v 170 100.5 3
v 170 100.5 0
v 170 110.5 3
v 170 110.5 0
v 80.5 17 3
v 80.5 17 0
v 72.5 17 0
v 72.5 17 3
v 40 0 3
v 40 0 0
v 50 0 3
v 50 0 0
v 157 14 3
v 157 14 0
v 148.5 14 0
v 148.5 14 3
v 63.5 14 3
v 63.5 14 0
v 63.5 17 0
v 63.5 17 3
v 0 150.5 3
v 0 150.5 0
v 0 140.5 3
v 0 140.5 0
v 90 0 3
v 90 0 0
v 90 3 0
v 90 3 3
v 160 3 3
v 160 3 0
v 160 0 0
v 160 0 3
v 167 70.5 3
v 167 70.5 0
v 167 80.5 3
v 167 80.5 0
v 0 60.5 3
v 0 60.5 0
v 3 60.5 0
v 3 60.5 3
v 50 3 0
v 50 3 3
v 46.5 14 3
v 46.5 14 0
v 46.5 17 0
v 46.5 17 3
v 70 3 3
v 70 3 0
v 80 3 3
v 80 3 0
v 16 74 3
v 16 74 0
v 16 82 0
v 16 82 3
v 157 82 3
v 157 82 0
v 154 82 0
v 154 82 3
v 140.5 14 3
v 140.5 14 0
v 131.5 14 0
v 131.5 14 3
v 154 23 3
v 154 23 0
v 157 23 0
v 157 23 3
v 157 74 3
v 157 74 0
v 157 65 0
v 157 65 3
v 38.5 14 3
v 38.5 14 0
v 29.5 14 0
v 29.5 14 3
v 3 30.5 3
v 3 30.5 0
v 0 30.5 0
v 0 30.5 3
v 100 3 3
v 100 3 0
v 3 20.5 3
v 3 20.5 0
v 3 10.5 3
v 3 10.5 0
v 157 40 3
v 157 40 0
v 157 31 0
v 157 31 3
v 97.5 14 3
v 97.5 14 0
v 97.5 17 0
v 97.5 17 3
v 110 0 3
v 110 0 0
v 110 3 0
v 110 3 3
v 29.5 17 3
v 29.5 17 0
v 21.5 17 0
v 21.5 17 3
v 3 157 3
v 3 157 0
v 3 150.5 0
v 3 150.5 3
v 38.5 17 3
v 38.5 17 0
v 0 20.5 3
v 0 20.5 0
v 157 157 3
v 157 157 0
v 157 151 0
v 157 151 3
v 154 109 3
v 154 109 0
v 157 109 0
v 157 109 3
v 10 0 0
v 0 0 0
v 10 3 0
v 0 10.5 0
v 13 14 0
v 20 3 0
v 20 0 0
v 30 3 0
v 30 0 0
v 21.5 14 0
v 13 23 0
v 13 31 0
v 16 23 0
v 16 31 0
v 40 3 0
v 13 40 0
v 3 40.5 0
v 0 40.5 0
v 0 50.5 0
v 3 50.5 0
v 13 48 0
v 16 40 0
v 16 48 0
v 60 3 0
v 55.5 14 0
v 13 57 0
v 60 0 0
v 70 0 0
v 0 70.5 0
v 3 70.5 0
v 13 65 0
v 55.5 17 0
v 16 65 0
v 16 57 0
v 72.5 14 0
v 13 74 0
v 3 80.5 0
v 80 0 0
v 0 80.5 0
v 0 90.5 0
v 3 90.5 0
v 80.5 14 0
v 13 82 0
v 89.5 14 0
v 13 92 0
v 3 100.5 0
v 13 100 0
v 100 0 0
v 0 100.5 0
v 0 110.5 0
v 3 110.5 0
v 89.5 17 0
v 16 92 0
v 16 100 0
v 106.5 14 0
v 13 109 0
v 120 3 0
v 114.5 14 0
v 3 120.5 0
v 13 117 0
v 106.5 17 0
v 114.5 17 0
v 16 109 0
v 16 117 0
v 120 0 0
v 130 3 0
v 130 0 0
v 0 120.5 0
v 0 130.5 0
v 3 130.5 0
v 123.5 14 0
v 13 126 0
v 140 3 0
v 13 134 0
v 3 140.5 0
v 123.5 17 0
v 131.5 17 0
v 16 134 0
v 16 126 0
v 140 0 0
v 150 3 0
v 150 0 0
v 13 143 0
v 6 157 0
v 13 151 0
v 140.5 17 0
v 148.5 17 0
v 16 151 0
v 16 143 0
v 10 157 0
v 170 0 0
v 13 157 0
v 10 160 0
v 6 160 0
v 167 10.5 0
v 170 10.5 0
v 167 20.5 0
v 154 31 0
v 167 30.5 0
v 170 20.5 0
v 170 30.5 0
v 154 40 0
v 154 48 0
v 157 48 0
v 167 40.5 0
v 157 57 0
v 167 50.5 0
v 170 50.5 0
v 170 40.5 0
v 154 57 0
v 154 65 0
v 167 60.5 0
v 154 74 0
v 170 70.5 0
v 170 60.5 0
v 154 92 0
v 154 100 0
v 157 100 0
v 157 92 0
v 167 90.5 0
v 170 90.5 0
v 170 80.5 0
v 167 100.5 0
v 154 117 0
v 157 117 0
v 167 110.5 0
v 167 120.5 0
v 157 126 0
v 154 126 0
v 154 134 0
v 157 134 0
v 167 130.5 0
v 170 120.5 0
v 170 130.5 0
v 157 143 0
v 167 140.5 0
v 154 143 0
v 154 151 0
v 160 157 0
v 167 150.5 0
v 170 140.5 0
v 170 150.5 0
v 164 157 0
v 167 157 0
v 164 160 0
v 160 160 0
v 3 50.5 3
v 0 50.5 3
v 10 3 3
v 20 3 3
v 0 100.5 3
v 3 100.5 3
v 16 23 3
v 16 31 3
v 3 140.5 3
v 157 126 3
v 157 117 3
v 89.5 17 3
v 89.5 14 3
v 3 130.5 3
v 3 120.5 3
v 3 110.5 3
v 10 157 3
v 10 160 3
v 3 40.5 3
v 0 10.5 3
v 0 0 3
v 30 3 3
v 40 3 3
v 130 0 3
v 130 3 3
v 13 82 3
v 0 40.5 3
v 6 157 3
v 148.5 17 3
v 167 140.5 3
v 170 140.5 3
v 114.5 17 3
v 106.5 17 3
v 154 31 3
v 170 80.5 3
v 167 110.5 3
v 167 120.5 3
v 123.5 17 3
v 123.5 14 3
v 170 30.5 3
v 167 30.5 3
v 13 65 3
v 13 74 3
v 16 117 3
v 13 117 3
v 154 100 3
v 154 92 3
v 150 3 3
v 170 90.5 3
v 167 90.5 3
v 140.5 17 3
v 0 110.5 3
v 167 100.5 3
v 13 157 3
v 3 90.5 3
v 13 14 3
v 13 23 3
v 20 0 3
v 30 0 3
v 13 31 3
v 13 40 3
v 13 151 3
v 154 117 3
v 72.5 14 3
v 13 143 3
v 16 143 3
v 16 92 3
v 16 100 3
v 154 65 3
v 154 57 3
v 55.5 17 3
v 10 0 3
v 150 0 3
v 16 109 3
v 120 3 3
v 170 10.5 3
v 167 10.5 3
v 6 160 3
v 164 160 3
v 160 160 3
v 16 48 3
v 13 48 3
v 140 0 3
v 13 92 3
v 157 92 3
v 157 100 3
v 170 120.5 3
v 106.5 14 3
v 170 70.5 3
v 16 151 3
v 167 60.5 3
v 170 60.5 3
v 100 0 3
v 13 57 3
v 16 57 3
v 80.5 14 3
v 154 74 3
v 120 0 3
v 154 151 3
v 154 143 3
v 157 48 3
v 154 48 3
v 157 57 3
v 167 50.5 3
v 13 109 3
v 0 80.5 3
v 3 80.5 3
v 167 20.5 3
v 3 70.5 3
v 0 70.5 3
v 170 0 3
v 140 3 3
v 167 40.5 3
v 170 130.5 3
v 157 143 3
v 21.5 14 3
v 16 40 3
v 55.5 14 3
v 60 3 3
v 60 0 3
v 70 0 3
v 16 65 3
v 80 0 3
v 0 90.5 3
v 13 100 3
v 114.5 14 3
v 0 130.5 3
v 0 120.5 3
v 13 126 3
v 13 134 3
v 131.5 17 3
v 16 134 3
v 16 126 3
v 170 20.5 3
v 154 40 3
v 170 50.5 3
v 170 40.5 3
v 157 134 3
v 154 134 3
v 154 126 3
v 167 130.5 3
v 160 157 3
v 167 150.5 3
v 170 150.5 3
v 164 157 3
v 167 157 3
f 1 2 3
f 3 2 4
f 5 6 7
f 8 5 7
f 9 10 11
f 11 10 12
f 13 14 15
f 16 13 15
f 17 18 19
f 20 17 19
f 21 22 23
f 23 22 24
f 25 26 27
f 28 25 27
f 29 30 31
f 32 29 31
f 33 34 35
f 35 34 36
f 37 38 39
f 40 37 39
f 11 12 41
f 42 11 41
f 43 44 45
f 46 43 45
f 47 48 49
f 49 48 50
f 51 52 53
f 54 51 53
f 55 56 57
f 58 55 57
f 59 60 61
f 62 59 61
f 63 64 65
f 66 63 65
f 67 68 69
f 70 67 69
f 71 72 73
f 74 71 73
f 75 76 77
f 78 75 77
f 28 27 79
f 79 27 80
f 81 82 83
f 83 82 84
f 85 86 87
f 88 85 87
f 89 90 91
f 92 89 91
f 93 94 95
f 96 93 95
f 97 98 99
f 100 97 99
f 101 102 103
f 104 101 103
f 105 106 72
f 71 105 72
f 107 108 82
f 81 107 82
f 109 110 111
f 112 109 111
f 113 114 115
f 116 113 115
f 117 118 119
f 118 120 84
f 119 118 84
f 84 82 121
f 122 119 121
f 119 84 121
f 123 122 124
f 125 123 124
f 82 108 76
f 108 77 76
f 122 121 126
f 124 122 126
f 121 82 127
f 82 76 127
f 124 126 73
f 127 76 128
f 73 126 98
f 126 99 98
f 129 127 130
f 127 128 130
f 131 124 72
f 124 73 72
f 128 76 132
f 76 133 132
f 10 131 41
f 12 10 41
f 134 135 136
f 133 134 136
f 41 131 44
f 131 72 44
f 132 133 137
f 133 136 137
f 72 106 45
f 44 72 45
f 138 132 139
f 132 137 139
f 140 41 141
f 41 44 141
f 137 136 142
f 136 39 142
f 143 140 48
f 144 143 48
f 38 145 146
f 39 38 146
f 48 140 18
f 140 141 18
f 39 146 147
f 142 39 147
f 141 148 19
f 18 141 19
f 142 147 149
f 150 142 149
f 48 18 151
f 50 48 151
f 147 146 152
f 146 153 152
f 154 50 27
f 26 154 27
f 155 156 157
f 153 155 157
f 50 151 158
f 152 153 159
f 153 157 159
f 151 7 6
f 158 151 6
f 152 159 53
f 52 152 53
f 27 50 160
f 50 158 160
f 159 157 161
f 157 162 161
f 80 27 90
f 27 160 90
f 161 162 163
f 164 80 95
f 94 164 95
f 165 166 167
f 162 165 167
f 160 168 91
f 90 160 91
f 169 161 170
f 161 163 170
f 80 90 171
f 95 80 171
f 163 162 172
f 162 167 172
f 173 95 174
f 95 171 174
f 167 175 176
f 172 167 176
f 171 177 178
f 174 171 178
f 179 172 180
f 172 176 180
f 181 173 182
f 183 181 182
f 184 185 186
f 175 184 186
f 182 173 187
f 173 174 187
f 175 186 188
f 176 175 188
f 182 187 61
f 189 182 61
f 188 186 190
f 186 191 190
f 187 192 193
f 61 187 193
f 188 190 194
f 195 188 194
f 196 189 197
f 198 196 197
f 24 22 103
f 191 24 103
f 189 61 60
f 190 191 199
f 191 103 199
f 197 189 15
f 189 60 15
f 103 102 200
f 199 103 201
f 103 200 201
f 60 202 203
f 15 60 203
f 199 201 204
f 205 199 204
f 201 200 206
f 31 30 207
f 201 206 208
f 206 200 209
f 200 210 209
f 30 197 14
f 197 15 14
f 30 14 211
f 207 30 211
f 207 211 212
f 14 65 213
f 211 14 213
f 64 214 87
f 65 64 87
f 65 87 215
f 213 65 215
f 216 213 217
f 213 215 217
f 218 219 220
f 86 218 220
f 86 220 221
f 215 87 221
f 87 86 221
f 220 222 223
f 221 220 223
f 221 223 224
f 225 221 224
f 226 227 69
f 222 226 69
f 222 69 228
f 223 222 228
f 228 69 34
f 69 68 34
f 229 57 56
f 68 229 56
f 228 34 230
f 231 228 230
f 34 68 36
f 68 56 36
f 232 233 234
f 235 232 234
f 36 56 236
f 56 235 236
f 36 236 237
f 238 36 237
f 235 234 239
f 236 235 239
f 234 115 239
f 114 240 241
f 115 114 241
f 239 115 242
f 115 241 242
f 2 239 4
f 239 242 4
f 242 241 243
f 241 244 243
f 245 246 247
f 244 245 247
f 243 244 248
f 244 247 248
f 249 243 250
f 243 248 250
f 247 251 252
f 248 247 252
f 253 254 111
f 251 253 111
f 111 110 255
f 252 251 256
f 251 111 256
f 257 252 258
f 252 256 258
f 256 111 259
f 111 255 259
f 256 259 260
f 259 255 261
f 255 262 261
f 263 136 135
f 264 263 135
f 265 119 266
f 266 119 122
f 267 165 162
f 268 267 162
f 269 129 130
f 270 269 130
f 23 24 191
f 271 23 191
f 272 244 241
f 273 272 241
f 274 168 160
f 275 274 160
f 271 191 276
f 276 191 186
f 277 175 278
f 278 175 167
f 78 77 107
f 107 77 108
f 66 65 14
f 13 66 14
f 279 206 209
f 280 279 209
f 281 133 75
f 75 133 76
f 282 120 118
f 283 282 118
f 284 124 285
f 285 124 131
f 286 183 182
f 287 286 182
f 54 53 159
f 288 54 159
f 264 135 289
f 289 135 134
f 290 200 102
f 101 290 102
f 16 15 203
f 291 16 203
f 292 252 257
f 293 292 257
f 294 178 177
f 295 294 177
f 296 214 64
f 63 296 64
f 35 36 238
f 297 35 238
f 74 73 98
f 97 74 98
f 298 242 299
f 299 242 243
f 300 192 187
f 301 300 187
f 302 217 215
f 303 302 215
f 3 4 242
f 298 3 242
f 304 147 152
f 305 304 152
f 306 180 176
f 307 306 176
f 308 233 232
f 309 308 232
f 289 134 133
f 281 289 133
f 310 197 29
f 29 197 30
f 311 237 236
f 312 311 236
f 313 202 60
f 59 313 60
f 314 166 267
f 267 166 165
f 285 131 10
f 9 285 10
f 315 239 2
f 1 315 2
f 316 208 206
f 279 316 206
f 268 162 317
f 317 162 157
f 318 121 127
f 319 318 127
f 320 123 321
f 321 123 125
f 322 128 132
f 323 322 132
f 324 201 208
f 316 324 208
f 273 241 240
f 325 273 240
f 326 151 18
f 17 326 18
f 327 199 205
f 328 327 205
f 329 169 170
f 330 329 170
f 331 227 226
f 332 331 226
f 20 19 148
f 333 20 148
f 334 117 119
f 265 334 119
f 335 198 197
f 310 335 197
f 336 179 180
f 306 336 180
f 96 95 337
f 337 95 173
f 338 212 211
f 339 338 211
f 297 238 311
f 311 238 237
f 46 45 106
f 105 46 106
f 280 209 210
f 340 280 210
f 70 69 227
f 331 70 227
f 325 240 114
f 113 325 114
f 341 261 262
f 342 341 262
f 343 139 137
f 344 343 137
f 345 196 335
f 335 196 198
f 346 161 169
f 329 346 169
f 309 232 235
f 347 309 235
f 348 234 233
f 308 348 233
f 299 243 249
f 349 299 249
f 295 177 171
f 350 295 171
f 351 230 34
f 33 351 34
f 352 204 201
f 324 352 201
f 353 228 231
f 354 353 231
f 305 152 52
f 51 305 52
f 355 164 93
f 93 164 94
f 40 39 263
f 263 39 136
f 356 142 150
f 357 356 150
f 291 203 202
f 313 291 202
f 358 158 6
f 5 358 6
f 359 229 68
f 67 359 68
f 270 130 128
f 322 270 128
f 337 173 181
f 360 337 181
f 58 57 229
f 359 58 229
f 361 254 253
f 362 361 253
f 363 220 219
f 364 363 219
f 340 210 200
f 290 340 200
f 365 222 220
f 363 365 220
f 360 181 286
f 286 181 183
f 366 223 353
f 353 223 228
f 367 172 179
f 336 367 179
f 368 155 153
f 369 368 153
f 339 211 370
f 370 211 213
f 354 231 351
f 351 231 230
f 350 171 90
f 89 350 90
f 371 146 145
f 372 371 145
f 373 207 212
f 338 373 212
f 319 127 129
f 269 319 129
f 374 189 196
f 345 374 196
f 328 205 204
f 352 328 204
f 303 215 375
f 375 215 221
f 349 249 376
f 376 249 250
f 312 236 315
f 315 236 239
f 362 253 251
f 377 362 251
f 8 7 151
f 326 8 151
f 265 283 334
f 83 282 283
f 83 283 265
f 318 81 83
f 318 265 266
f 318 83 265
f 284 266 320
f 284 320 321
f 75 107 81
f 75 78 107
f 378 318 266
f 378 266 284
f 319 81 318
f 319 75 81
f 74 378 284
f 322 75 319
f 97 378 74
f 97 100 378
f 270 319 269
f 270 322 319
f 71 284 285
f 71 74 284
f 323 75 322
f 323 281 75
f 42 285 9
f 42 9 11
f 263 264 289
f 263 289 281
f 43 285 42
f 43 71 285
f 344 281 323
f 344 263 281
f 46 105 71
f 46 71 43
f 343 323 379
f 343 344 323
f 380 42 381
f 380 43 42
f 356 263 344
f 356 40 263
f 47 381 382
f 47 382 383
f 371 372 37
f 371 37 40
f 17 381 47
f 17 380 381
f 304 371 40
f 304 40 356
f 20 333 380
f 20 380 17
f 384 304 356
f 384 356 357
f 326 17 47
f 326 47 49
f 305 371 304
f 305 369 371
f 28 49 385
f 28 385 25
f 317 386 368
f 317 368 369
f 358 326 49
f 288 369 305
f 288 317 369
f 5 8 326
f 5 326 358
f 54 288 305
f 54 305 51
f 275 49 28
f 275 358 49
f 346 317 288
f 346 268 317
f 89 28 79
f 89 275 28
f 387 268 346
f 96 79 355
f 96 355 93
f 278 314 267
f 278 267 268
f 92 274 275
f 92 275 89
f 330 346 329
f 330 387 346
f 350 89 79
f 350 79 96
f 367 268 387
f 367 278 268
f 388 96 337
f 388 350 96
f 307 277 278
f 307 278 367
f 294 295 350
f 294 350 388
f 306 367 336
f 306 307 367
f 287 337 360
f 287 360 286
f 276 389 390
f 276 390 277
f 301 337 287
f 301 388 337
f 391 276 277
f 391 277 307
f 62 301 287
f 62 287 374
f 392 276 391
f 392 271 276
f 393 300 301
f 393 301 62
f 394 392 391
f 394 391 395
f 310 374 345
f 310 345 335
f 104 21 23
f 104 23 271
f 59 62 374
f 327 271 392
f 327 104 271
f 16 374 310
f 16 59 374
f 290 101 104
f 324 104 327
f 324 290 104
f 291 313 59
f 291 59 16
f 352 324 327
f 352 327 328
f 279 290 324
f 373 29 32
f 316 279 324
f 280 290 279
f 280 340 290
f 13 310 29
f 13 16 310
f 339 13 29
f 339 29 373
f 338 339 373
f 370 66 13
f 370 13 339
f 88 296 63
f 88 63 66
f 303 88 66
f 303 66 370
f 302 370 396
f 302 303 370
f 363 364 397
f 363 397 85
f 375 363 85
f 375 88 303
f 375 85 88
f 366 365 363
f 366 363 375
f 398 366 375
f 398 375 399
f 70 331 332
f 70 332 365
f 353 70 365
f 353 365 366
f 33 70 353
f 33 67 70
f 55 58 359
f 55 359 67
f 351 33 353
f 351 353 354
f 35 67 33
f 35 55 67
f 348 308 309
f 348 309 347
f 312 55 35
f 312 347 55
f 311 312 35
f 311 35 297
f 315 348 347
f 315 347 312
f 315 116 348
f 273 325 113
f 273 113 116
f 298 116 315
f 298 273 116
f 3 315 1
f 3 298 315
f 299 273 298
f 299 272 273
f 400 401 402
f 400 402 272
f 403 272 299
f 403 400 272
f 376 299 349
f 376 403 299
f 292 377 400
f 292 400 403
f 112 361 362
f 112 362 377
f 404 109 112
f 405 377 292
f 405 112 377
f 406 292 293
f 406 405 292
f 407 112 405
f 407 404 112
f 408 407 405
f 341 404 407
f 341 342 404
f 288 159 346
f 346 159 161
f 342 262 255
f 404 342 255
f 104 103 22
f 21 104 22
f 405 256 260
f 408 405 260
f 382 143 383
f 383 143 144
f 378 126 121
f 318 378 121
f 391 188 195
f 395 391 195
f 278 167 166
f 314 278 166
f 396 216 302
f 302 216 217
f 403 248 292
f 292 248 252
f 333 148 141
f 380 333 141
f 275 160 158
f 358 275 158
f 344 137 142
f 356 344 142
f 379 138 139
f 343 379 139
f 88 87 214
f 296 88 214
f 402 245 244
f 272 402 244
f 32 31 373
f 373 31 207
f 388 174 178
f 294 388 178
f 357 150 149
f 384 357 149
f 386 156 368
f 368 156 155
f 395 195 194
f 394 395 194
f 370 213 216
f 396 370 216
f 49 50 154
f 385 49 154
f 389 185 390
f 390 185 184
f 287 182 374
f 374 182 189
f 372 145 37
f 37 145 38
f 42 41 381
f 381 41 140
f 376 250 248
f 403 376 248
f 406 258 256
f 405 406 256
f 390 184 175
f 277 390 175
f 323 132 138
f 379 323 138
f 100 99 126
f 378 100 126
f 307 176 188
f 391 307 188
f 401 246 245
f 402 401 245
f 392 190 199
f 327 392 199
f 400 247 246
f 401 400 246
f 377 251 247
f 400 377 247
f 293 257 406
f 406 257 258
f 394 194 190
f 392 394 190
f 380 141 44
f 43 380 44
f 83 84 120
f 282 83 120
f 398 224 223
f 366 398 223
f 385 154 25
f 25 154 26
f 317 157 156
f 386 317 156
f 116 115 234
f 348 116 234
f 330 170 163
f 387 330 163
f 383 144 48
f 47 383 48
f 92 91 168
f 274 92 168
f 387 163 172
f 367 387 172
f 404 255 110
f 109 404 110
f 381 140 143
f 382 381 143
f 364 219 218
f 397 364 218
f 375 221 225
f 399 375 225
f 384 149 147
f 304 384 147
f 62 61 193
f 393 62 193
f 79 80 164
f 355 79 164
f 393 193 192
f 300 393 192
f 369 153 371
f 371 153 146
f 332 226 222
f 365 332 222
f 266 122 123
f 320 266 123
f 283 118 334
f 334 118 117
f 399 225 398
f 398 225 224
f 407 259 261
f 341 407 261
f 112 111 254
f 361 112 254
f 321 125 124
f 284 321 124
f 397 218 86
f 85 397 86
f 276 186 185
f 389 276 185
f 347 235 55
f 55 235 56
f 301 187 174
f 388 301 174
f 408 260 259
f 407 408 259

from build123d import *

# Parameters (mm, degrees)
F1_DEPTH = 3


with BuildPart() as f1:
    # F0 (on Top) → F1 (new body)
    with BuildSketch(Plane.XY):
        Polygon((0, 10.5), (0, 0), (10, 0), (10, 3), (20, 3), (20, 0), (30, 0), (30, 3), (40, 3), (40, 0), (50, 0), (50, 3), (60, 3), (60, 0), (70, 0), (70, 3), (80, 3), (80, 0), (90, 0), (90, 3), (100, 3), (100, 0), (110, 0), (110, 3), (120, 3), (120, 0), (130, 0), (130, 3), (140, 3), (140, 0), (150, 0), (150, 3), (160, 3), (160, 0), (170, 0), (170, 10.5), (167, 10.5), (167, 20.5), (170, 20.5), (170, 30.5), (167, 30.5), (167, 40.5), (170, 40.5), (170, 50.5), (167, 50.5), (167, 60.5), (170, 60.5), (170, 70.5), (167, 70.5), (167, 80.5), (170, 80.5), (170, 90.5), (167, 90.5), (167, 100.5), (170, 100.5), (170, 110.5), (167, 110.5), (167, 120.5), (170, 120.5), (170, 130.5), (167, 130.5), (167, 140.5), (170, 140.5), (170, 150.5), (167, 150.5), (167, 157), (164, 157), (164, 160), (160, 160), (160, 157), (157, 157), (157, 151), (154, 151), (154, 143), (157, 143), (157, 134), (154, 134), (154, 126), (157, 126), (157, 117), (154, 117), (154, 109), (157, 109), (157, 100), (154, 100), (154, 92), (157, 92), (157, 82), (154, 82), (154, 74), (157, 74), (157, 65), (154, 65), (154, 57), (157, 57), (157, 48), (154, 48), (154, 40), (157, 40), (157, 31), (154, 31), (154, 23), (157, 23), (157, 14), (148.5, 14), (148.5, 17), (140.5, 17), (140.5, 14), (131.5, 14), (131.5, 17), (123.5, 17), (123.5, 14), (114.5, 14), (114.5, 17), (106.5, 17), (106.5, 14), (97.5, 14), (97.5, 17), (89.5, 17), (89.5, 14), (80.5, 14), (80.5, 17), (72.5, 17), (72.5, 14), (63.5, 14), (63.5, 17), (55.5, 17), (55.5, 14), (46.5, 14), (46.5, 17), (38.5, 17), (38.5, 14), (29.5, 14), (29.5, 17), (21.5, 17), (21.5, 14), (13, 14), (13, 23), (16, 23), (16, 31), (13, 31), (13, 40), (16, 40), (16, 48), (13, 48), (13, 57), (16, 57), (16, 65), (13, 65), (13, 74), (16, 74), (16, 82), (13, 82), (13, 92), (16, 92), (16, 100), (13, 100), (13, 109), (16, 109), (16, 117), (13, 117), (13, 126), (16, 126), (16, 134), (13, 134), (13, 143), (16, 143), (16, 151), (13, 151), (13, 157), (10, 157), (10, 160), (6, 160), (6, 157), (3, 157), (3, 150.5), (0, 150.5), (0, 140.5), (3, 140.5), (3, 130.5), (0, 130.5), (0, 120.5), (3, 120.5), (3, 110.5), (0, 110.5), (0, 100.5), (3, 100.5), (3, 90.5), (0, 90.5), (0, 80.5), (3, 80.5), (3, 70.5), (0, 70.5), (0, 60.5), (3, 60.5), (3, 50.5), (0, 50.5), (0, 40.5), (3, 40.5), (3, 30.5), (0, 30.5), (0, 20.5), (3, 20.5), (3, 10.5), align=None)
    extrude(amount=F1_DEPTH)


solid = f1.part
